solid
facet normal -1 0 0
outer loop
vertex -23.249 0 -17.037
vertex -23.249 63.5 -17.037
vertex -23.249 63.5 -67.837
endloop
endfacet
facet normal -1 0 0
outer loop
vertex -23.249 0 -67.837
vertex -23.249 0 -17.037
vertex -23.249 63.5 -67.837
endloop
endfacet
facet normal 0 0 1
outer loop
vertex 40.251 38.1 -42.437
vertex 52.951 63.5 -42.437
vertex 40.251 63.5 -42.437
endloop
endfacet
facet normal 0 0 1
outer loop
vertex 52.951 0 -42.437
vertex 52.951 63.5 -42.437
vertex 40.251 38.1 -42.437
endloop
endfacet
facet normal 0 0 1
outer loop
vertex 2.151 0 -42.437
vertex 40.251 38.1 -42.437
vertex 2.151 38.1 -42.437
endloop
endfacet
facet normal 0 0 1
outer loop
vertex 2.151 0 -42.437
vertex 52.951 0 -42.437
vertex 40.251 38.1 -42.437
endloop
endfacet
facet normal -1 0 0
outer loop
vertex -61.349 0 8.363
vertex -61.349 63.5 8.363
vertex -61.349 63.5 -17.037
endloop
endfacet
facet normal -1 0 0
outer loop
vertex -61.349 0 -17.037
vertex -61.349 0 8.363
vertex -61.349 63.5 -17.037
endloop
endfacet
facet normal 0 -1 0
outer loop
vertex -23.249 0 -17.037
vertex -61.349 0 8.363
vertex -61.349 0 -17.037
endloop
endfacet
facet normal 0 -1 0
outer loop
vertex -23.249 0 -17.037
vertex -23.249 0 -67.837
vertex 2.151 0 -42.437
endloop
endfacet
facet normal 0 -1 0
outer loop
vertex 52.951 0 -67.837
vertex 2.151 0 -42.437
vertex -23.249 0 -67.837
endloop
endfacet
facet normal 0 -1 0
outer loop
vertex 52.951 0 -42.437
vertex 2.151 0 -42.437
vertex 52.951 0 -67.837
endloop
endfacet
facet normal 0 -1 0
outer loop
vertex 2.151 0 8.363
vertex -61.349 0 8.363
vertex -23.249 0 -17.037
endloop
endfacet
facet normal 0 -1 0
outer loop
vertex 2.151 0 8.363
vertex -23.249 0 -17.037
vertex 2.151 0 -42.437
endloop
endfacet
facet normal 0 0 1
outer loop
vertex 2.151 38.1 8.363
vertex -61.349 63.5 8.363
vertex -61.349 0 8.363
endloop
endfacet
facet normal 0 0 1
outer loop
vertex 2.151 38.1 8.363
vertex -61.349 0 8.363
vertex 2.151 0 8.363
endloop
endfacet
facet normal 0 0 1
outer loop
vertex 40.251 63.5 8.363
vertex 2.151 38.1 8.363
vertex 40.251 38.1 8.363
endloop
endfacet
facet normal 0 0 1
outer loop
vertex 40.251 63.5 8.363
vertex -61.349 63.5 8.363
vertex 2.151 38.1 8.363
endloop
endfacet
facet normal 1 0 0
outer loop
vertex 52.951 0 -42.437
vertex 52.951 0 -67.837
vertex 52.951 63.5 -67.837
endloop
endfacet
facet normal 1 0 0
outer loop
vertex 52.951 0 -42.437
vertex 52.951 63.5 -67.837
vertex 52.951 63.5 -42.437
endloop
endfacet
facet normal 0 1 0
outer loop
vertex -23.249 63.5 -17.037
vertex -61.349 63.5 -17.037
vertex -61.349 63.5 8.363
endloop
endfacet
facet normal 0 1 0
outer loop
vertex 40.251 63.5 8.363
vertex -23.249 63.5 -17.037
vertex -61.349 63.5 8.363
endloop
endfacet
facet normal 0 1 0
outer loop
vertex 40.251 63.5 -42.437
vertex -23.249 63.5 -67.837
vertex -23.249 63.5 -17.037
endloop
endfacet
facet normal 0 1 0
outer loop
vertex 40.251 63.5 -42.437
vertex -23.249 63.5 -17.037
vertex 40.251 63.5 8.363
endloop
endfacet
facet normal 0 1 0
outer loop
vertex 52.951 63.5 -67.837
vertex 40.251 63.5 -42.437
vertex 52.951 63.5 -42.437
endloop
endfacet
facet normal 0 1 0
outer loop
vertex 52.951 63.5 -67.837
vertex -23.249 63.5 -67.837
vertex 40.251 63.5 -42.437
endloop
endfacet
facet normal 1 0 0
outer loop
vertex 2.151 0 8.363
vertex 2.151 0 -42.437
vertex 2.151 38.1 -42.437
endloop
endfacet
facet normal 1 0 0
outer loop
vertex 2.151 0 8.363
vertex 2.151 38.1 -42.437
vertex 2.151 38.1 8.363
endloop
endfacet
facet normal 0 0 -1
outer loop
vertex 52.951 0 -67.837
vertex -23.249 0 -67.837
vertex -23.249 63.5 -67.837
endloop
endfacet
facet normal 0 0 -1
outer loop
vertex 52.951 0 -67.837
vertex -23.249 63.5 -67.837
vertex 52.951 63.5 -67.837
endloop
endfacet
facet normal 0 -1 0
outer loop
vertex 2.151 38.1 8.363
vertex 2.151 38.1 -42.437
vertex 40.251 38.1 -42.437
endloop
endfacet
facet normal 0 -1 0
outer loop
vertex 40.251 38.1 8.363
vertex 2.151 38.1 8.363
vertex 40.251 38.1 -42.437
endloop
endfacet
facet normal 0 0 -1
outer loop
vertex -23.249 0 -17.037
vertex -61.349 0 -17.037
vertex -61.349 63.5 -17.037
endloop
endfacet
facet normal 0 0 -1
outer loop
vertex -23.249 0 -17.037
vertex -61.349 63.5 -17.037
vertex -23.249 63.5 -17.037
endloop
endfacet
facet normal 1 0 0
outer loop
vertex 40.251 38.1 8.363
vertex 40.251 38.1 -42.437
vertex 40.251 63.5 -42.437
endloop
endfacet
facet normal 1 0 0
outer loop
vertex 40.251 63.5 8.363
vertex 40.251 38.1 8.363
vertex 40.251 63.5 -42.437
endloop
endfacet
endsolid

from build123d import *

# Parameters (mm, degrees)
F1_DEPTH = 63.5
F2_W     = 38.1
F2_H     = 25.4
F3_DEPTH = 50.8


with BuildPart() as f1:
    # F0 (on Front) → F1 (new body)
    with BuildSketch(Plane.XZ):
        Polygon((2.150557, 8.363415), (-61.349443, 8.363415), (-61.349443, -17.036585), (-23.249443, -17.036585), (-23.249443, -67.836585), (52.950557, -67.836585), (52.950557, -42.436585), (2.150557, -42.436585), align=None)
    extrude(amount=-F1_DEPTH)

    # F2 (on face) → F3 (join)
    with BuildSketch(Plane.XY.offset(-42.436585)):
        with Locations((21.200557, 50.8)):
            Rectangle(F2_W, F2_H)
    extrude(amount=F3_DEPTH)


solid = f1.part
